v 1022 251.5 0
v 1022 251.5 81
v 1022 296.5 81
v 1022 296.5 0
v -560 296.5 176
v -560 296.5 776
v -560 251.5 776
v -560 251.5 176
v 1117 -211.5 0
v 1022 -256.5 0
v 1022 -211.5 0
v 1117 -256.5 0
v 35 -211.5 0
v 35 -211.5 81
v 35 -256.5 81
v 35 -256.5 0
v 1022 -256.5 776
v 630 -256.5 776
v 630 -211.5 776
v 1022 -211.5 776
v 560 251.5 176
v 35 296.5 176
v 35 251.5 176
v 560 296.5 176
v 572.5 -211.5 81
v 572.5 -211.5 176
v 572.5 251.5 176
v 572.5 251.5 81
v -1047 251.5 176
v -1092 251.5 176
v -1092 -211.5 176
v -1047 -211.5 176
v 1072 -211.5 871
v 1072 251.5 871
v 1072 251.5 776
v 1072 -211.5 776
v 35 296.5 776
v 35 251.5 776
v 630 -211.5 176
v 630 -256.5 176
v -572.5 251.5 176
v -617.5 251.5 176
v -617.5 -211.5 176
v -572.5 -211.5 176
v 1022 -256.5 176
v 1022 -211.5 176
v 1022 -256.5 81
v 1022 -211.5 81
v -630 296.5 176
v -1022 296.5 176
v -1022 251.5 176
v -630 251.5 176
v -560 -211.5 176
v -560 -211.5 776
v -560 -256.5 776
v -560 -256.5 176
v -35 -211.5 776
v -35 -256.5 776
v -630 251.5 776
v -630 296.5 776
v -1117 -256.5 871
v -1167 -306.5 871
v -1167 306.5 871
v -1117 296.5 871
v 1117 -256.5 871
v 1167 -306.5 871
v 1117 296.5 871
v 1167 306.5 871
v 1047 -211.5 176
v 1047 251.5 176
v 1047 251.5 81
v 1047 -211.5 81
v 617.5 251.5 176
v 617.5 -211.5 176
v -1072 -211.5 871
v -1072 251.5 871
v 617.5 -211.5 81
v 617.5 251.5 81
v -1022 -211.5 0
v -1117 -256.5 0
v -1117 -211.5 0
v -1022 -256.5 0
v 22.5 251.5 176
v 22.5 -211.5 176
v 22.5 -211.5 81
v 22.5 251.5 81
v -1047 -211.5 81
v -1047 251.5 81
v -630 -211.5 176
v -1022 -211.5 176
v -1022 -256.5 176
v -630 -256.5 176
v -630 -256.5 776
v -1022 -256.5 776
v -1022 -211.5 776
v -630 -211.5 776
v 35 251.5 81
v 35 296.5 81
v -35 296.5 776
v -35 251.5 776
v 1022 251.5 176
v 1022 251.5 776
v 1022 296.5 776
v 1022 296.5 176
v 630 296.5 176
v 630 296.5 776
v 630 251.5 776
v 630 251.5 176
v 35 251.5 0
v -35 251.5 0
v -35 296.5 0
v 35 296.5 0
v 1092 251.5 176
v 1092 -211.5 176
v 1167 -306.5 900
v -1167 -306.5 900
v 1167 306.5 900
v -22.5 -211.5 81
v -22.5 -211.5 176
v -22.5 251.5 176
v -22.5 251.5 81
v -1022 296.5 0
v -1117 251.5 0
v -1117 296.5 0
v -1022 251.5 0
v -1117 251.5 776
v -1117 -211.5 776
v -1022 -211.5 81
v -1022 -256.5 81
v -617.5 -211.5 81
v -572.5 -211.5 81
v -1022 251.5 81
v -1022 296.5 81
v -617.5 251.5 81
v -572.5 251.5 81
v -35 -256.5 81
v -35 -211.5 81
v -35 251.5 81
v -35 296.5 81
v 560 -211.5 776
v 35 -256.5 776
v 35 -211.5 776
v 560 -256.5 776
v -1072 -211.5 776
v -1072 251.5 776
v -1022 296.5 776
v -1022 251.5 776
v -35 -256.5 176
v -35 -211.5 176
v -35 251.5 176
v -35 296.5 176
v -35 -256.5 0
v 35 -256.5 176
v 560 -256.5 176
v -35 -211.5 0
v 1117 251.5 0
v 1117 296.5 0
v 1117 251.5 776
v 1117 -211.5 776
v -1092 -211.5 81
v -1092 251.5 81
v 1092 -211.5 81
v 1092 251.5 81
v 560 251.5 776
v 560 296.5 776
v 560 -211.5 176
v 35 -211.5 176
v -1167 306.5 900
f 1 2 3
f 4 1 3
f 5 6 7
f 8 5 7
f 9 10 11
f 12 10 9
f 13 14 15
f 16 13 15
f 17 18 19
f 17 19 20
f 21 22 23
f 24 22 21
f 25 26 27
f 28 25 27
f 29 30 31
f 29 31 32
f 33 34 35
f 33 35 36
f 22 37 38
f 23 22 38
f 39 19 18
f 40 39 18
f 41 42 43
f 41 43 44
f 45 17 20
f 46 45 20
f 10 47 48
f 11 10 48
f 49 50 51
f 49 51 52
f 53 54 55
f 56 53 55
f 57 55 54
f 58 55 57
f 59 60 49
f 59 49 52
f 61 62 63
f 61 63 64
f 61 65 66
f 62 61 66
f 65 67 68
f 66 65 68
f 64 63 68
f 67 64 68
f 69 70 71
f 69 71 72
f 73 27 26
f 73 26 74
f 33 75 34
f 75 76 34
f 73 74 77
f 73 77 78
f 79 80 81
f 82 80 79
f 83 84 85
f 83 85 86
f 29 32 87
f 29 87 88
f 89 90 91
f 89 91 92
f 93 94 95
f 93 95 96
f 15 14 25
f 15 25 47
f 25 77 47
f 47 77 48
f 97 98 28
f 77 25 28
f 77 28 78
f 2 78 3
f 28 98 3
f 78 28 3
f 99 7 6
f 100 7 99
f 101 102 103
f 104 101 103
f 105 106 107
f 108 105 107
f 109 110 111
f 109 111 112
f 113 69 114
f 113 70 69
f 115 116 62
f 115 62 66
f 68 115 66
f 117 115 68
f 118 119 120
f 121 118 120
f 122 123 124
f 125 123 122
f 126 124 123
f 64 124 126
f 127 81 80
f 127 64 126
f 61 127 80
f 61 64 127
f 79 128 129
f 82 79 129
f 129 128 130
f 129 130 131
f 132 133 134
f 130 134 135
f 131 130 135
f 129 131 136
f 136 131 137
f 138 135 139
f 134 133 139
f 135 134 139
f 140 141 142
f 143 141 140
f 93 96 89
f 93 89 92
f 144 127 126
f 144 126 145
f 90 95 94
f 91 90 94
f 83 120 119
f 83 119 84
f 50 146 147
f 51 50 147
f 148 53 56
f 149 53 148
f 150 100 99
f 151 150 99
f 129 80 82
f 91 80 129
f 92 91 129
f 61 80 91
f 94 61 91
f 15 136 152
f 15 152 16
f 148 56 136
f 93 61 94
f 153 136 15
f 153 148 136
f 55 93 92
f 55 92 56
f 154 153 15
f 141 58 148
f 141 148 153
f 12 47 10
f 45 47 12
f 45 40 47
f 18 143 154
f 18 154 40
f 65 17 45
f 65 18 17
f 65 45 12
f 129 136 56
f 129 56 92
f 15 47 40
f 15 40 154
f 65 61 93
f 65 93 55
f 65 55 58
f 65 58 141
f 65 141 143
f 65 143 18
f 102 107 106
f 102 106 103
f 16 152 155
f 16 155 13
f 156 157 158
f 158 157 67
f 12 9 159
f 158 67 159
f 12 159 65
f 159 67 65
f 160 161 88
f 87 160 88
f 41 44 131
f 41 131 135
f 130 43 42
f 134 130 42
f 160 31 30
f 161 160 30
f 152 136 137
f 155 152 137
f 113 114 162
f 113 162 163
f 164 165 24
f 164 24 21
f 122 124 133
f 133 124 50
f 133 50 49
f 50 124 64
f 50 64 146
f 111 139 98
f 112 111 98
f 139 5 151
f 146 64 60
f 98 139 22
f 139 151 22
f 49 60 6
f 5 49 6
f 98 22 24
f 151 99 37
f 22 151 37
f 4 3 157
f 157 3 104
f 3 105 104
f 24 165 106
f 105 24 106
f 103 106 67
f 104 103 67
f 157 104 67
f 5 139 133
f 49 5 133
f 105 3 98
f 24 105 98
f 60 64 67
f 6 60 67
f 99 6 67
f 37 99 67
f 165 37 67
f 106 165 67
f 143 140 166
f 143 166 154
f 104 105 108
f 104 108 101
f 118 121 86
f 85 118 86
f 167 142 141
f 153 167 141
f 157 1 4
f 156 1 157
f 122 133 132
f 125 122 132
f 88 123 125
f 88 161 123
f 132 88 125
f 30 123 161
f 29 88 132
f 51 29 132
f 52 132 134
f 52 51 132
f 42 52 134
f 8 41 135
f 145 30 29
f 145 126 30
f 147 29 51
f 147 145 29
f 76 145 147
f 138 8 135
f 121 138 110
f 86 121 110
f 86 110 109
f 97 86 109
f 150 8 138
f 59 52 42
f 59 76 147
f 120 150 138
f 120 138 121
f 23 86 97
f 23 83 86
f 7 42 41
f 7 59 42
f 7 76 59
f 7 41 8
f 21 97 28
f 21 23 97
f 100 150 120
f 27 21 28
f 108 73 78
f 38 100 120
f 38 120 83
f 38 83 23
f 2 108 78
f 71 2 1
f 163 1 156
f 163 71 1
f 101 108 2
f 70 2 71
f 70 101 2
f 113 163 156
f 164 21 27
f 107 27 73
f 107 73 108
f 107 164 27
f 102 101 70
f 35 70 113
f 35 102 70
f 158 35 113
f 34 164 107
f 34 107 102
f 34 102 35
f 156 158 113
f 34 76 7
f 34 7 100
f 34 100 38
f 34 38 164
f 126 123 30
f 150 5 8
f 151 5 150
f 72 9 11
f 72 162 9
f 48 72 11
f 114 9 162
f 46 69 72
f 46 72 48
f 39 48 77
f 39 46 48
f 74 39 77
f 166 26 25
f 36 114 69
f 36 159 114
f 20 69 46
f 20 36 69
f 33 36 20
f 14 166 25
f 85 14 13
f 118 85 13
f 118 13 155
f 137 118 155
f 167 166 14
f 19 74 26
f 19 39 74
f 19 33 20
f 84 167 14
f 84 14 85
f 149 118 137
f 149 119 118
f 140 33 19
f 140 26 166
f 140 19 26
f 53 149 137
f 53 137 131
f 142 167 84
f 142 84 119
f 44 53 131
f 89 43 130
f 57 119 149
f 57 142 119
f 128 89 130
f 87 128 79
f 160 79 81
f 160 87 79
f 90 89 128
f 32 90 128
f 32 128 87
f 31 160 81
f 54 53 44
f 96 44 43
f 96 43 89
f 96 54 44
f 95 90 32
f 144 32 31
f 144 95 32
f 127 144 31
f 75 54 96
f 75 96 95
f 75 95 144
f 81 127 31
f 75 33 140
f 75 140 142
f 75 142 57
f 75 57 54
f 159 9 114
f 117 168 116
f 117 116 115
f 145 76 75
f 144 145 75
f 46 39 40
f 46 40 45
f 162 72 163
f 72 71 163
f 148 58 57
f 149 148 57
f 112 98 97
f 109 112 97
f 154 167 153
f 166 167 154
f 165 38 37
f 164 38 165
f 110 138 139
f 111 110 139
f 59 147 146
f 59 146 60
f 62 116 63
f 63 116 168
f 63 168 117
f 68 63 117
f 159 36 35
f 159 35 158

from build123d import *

# Parameters (mm, degrees)
F1_W     = 2334
F1_H     = 613
F2_DEPTH = 29
F4_DEPTH = 871
F3_W     = 45
F3_H     = 463
F3_W_2   = 392
F3_H_2   = 45
F3_W_3   = 525
F7_DEPTH = 95
F3_W_4   = 70
F8_DEPTH = 750
F6_W     = 2184
F6_H     = 553
F6_W_2   = 45
F6_H_2   = 463
F9_DEPTH = 95


with BuildPart() as f2:
    # F1 (on offset) → F2 (new body)
    with BuildSketch(Plane.XY.offset(900)):
        Rectangle(F1_W, F1_H)
    extrude(amount=-F2_DEPTH)

    # F3 (on face) → F4 (join)
    with BuildSketch(Plane(origin=(0, 0, 871), x_dir=(1, 0, 0), z_dir=(0, 0, -1))):
        Polygon((-1022, 256.5), (-1117, 256.5), (-1117, 211.5), (-1072, 211.5), (-1022, 211.5), align=None)
        Polygon((-1072, -251.5), (-1117, -251.5), (-1117, -296.5), (-1022, -296.5), (-1022, -251.5), align=None)
        Polygon((1117, -296.5), (1117, -251.5), (1072, -251.5), (1022, -251.5), (1022, -296.5), align=None)
        Polygon((1117, 256.5), (1022, 256.5), (1022, 211.5), (1072, 211.5), (1117, 211.5), align=None)
        Polygon((35, 256.5), (-35, 256.5), (-35, 211.5), (-22.5, 211.5), (22.5, 211.5), (35, 211.5), align=None)
        Polygon((22.5, -251.5), (-22.5, -251.5), (-35, -251.5), (-35, -296.5), (35, -296.5), (35, -251.5), align=None)
    extrude(amount=F4_DEPTH)

    # F3 (on face) → F7 (join)
    with BuildSketch(Plane(origin=(0, 0, 871), x_dir=(1, 0, 0), z_dir=(0, 0, -1))):
        with Locations((-1094.5, -20)):
            Rectangle(F3_W, F3_H)
        with Locations((-826, 234)):
            Rectangle(F3_W_2, F3_H_2)
        with Locations((-826, -274)):
            Rectangle(F3_W_2, F3_H_2)
        with Locations((-297.5, -274)):
            Rectangle(F3_W_3, F3_H_2)
        with Locations((-297.5, 234)):
            Rectangle(F3_W_3, F3_H_2)
        with Locations((297.5, 234)):
            Rectangle(F3_W_3, F3_H_2)
        with Locations((297.5, -274)):
            Rectangle(F3_W_3, F3_H_2)
        with Locations((826, -274)):
            Rectangle(F3_W_2, F3_H_2)
        with Locations((826, 234)):
            Rectangle(F3_W_2, F3_H_2)
        with Locations((1094.5, -20)):
            Rectangle(F3_W, F3_H)
    extrude(amount=F7_DEPTH)

    # F3 (on face) → F8 (join)
    with BuildSketch(Plane(origin=(0, 0, 871), x_dir=(1, 0, 0), z_dir=(0, 0, -1))):
        with Locations((-595, 234)):
            Rectangle(F3_W_4, F3_H_2)
        with Locations((-595, -274)):
            Rectangle(F3_W_4, F3_H_2)
        with Locations((595, -274)):
            Rectangle(F3_W_4, F3_H_2)
        with Locations((595, 234)):
            Rectangle(F3_W_4, F3_H_2)
    extrude(amount=F8_DEPTH)

    # F6 (on offset) → F9 (join)
    with BuildSketch(Plane.XY.offset(176)):
        with Locations((0, 20)):
            Rectangle(F6_W, F6_H)
        Polygon((-617.5, -211.5), (-1047, -211.5), (-1047, 251.5), (-617.5, 251.5), (-572.5, 251.5), (-22.5, 251.5), (22.5, 251.5), (572.5, 251.5), (617.5, 251.5), (1047, 251.5), (1047, -211.5), (617.5, -211.5), (572.5, -211.5), (22.5, -211.5), (-22.5, -211.5), (-572.5, -211.5), align=None, mode=Mode.SUBTRACT)
        with Locations((-595, 20)):
            Rectangle(F6_W_2, F6_H_2)
        with Locations((0, 20)):
            Rectangle(F6_W_2, F6_H_2)
        with Locations((595, 20)):
            Rectangle(F6_W_2, F6_H_2)
    extrude(amount=-F9_DEPTH)


solid = f2.part
